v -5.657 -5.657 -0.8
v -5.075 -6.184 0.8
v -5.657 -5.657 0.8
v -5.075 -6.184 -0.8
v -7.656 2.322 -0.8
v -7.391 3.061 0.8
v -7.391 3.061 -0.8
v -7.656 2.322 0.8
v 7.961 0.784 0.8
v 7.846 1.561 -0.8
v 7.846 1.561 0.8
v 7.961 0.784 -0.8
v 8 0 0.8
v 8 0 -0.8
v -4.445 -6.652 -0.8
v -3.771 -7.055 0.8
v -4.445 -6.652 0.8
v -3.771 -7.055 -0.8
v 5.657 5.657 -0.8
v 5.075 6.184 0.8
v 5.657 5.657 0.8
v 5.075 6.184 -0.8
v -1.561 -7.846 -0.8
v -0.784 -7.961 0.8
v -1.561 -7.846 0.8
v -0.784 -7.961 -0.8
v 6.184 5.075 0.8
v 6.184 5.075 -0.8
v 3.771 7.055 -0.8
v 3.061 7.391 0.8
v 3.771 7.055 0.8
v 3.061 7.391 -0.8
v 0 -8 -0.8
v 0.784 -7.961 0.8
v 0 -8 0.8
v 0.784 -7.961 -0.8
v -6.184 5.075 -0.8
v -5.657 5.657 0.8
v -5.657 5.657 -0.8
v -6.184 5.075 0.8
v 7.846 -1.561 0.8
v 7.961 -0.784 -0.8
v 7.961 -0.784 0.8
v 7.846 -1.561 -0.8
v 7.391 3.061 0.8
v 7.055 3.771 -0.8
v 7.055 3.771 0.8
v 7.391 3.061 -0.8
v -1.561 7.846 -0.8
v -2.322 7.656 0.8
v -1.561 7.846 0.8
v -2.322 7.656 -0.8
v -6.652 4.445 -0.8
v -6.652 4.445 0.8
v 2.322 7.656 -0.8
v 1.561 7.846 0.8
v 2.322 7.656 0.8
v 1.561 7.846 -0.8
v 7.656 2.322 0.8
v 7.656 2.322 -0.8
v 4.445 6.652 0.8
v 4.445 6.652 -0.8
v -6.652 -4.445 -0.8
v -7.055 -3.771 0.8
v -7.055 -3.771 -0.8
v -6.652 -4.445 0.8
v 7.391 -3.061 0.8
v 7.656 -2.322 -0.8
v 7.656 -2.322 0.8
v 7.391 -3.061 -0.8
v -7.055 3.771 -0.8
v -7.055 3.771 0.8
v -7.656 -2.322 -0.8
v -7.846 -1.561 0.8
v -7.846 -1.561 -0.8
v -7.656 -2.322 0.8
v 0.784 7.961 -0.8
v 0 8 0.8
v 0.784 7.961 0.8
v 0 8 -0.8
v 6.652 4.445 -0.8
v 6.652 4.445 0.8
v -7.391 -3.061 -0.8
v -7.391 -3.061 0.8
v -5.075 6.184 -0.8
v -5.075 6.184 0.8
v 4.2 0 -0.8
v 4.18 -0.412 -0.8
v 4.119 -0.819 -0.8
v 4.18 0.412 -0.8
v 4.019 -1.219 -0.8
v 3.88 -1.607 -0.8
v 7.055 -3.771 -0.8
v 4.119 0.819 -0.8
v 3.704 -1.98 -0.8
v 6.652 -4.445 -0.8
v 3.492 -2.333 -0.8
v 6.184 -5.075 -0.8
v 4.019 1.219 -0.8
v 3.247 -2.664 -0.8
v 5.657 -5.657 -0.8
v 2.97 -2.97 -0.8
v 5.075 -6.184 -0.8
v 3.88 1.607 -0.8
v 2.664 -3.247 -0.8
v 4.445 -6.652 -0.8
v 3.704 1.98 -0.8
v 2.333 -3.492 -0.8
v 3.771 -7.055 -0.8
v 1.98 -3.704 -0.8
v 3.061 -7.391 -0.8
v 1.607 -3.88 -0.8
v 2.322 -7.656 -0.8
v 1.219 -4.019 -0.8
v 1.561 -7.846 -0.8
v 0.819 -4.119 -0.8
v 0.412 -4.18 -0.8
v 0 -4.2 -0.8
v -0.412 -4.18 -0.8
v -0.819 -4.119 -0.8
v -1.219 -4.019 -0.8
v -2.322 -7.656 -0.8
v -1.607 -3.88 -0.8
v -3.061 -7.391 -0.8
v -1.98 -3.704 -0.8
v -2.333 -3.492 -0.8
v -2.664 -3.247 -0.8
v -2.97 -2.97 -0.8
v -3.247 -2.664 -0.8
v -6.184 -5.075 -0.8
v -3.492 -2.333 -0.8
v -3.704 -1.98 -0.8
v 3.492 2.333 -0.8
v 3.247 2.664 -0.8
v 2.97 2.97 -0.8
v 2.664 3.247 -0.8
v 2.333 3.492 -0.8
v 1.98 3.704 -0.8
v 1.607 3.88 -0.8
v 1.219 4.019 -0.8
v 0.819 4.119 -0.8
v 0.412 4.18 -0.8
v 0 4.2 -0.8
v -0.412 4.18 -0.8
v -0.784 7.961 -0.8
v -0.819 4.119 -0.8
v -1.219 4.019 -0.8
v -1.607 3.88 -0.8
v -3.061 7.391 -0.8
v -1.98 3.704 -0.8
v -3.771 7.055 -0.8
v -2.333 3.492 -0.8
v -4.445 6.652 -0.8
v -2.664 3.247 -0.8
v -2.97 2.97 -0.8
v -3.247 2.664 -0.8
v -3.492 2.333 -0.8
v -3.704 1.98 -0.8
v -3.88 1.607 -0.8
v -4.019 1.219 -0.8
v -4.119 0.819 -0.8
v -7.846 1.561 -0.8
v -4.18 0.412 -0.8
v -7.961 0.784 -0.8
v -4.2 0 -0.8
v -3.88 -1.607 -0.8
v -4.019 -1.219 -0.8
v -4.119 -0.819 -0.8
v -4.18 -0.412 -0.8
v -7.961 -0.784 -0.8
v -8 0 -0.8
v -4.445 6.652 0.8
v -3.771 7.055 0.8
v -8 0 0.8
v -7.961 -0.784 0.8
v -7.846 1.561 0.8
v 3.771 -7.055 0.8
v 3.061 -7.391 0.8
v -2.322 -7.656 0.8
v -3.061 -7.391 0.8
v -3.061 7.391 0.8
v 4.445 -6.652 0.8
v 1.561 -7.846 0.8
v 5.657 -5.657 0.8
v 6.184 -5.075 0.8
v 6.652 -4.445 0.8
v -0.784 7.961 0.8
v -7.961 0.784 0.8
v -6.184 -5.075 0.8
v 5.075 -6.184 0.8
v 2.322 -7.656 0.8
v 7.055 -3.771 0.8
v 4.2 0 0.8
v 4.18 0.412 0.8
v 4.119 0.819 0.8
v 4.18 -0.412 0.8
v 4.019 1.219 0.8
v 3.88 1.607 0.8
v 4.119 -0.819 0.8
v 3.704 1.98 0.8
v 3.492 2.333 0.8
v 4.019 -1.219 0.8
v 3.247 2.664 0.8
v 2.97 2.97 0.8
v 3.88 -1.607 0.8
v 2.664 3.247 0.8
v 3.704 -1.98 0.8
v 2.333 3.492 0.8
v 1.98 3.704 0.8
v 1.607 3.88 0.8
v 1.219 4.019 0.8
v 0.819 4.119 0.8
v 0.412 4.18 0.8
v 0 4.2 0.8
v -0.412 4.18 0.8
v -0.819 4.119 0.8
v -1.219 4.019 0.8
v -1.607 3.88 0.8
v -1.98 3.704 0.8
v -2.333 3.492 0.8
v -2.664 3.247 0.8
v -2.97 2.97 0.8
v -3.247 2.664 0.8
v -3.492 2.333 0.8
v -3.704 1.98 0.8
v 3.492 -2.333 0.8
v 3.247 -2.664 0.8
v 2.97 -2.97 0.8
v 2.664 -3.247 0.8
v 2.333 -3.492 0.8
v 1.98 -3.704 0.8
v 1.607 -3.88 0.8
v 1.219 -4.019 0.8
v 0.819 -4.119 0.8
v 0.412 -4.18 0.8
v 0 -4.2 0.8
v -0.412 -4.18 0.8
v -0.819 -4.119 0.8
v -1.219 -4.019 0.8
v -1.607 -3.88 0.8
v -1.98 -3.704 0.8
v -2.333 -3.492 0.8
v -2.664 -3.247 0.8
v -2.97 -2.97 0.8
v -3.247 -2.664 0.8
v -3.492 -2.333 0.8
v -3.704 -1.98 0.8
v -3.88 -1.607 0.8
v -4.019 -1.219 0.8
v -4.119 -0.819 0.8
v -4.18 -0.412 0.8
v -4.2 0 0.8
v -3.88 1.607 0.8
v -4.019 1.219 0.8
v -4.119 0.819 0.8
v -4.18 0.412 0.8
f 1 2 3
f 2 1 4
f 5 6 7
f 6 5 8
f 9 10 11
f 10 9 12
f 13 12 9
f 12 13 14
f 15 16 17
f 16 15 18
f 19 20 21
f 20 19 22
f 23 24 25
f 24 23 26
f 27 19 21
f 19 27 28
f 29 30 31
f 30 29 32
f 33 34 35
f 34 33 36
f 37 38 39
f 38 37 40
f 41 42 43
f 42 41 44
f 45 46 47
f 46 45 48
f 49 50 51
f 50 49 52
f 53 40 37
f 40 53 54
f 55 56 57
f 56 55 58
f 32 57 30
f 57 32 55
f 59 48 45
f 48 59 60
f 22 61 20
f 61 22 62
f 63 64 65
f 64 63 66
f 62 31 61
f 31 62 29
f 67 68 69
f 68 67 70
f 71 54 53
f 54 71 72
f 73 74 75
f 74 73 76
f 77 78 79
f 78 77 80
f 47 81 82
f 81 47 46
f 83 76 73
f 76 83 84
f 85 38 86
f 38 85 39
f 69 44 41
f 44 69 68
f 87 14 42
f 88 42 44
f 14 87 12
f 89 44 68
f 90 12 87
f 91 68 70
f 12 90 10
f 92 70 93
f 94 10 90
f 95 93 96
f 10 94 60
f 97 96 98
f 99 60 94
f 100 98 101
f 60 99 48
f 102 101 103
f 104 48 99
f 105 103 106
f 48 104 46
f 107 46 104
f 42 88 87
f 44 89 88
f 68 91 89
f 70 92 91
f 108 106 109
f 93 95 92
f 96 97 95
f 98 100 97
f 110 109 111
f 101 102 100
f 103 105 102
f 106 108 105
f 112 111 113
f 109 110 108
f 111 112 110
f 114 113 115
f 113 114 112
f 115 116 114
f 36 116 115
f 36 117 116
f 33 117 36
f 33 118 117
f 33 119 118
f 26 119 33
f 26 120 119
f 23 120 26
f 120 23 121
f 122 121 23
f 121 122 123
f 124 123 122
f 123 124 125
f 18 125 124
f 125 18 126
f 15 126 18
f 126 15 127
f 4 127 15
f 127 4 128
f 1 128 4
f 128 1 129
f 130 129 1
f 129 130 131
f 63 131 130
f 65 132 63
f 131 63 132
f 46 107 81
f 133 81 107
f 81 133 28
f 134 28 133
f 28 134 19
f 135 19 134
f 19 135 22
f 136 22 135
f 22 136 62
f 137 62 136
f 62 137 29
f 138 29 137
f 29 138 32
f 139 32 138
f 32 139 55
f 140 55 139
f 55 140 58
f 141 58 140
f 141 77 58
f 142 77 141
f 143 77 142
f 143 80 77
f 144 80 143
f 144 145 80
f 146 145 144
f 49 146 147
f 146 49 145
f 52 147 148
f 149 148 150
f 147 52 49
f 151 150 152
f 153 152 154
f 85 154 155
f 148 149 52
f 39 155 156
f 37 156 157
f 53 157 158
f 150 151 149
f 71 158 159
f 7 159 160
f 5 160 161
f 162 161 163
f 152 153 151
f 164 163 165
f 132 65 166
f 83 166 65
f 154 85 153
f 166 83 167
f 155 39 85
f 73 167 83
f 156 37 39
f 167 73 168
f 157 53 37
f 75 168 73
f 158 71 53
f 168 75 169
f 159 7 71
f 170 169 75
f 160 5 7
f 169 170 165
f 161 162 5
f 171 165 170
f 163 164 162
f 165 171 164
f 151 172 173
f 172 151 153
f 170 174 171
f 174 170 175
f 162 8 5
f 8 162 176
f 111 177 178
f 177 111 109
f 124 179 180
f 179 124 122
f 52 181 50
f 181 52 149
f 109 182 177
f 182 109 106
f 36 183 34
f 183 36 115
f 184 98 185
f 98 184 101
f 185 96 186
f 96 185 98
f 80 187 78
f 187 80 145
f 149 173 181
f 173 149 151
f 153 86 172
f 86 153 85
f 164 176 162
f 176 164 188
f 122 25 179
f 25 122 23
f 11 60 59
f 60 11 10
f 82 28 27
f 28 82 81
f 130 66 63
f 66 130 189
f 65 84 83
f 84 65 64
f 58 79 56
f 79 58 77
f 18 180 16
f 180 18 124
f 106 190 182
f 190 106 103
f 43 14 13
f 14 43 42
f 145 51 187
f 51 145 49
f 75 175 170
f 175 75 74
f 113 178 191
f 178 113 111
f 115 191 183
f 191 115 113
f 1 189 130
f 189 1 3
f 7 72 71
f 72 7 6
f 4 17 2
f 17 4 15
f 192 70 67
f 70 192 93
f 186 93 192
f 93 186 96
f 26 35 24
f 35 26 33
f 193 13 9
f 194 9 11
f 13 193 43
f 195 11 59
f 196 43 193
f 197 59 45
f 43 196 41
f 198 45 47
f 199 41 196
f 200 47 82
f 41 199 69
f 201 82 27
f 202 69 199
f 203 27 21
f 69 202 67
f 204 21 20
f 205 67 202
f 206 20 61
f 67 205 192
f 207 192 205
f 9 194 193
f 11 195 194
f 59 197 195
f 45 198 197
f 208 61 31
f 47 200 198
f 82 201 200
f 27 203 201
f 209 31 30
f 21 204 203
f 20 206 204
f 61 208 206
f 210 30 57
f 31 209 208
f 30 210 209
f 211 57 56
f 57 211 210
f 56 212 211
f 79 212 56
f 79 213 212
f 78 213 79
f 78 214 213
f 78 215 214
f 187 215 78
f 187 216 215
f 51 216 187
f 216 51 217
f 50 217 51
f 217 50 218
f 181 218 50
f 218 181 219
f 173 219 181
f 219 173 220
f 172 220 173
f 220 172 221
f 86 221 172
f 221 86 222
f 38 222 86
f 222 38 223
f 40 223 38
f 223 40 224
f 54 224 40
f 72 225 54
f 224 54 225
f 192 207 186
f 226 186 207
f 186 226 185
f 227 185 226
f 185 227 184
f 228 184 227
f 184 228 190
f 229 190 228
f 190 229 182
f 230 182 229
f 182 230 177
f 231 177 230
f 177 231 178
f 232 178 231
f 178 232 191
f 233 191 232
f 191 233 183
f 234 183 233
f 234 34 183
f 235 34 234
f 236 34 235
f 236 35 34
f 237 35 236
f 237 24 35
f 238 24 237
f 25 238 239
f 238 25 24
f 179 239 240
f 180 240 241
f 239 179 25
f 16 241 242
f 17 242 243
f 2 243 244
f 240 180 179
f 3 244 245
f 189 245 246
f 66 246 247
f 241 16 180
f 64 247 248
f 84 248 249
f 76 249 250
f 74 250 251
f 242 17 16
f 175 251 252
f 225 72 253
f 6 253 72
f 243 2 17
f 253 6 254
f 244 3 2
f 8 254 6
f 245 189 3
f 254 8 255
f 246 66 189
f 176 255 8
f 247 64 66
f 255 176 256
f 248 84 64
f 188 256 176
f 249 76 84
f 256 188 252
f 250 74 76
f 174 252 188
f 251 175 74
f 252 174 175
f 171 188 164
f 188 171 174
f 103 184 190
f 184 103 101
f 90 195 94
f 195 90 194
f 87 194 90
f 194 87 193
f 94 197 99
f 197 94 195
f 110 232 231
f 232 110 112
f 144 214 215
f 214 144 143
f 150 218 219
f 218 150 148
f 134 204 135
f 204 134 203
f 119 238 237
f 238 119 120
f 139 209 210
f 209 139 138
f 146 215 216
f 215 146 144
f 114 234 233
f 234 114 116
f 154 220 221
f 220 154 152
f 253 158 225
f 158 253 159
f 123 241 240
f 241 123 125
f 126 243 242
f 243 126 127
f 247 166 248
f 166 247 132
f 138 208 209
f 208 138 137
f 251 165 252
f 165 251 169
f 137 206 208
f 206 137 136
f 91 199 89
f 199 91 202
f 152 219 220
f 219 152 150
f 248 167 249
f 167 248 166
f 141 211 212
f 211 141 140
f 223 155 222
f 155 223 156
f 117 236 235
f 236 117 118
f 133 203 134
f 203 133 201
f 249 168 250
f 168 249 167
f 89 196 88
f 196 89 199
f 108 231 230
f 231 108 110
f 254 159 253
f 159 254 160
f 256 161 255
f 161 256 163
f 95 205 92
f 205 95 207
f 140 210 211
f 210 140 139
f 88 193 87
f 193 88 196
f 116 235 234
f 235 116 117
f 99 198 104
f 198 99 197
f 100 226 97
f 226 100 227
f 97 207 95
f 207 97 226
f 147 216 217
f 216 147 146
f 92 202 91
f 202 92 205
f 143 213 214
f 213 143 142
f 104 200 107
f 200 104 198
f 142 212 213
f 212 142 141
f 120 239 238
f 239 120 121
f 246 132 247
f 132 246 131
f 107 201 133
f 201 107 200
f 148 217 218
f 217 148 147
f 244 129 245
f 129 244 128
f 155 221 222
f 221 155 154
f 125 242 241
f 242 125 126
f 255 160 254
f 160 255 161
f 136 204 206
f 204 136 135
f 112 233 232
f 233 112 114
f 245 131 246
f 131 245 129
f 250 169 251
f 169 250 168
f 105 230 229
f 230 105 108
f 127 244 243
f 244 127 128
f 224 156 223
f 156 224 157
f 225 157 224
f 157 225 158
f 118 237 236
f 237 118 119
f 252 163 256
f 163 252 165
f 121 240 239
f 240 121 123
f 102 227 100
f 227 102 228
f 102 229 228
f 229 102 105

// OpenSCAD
$fn=64;

od = 16;
id = 8.4;
th = 1.6;

difference() {
  cylinder(h=th, d=od, center=true);
  cylinder(h=th+0.2, d=id, center=true);
}
